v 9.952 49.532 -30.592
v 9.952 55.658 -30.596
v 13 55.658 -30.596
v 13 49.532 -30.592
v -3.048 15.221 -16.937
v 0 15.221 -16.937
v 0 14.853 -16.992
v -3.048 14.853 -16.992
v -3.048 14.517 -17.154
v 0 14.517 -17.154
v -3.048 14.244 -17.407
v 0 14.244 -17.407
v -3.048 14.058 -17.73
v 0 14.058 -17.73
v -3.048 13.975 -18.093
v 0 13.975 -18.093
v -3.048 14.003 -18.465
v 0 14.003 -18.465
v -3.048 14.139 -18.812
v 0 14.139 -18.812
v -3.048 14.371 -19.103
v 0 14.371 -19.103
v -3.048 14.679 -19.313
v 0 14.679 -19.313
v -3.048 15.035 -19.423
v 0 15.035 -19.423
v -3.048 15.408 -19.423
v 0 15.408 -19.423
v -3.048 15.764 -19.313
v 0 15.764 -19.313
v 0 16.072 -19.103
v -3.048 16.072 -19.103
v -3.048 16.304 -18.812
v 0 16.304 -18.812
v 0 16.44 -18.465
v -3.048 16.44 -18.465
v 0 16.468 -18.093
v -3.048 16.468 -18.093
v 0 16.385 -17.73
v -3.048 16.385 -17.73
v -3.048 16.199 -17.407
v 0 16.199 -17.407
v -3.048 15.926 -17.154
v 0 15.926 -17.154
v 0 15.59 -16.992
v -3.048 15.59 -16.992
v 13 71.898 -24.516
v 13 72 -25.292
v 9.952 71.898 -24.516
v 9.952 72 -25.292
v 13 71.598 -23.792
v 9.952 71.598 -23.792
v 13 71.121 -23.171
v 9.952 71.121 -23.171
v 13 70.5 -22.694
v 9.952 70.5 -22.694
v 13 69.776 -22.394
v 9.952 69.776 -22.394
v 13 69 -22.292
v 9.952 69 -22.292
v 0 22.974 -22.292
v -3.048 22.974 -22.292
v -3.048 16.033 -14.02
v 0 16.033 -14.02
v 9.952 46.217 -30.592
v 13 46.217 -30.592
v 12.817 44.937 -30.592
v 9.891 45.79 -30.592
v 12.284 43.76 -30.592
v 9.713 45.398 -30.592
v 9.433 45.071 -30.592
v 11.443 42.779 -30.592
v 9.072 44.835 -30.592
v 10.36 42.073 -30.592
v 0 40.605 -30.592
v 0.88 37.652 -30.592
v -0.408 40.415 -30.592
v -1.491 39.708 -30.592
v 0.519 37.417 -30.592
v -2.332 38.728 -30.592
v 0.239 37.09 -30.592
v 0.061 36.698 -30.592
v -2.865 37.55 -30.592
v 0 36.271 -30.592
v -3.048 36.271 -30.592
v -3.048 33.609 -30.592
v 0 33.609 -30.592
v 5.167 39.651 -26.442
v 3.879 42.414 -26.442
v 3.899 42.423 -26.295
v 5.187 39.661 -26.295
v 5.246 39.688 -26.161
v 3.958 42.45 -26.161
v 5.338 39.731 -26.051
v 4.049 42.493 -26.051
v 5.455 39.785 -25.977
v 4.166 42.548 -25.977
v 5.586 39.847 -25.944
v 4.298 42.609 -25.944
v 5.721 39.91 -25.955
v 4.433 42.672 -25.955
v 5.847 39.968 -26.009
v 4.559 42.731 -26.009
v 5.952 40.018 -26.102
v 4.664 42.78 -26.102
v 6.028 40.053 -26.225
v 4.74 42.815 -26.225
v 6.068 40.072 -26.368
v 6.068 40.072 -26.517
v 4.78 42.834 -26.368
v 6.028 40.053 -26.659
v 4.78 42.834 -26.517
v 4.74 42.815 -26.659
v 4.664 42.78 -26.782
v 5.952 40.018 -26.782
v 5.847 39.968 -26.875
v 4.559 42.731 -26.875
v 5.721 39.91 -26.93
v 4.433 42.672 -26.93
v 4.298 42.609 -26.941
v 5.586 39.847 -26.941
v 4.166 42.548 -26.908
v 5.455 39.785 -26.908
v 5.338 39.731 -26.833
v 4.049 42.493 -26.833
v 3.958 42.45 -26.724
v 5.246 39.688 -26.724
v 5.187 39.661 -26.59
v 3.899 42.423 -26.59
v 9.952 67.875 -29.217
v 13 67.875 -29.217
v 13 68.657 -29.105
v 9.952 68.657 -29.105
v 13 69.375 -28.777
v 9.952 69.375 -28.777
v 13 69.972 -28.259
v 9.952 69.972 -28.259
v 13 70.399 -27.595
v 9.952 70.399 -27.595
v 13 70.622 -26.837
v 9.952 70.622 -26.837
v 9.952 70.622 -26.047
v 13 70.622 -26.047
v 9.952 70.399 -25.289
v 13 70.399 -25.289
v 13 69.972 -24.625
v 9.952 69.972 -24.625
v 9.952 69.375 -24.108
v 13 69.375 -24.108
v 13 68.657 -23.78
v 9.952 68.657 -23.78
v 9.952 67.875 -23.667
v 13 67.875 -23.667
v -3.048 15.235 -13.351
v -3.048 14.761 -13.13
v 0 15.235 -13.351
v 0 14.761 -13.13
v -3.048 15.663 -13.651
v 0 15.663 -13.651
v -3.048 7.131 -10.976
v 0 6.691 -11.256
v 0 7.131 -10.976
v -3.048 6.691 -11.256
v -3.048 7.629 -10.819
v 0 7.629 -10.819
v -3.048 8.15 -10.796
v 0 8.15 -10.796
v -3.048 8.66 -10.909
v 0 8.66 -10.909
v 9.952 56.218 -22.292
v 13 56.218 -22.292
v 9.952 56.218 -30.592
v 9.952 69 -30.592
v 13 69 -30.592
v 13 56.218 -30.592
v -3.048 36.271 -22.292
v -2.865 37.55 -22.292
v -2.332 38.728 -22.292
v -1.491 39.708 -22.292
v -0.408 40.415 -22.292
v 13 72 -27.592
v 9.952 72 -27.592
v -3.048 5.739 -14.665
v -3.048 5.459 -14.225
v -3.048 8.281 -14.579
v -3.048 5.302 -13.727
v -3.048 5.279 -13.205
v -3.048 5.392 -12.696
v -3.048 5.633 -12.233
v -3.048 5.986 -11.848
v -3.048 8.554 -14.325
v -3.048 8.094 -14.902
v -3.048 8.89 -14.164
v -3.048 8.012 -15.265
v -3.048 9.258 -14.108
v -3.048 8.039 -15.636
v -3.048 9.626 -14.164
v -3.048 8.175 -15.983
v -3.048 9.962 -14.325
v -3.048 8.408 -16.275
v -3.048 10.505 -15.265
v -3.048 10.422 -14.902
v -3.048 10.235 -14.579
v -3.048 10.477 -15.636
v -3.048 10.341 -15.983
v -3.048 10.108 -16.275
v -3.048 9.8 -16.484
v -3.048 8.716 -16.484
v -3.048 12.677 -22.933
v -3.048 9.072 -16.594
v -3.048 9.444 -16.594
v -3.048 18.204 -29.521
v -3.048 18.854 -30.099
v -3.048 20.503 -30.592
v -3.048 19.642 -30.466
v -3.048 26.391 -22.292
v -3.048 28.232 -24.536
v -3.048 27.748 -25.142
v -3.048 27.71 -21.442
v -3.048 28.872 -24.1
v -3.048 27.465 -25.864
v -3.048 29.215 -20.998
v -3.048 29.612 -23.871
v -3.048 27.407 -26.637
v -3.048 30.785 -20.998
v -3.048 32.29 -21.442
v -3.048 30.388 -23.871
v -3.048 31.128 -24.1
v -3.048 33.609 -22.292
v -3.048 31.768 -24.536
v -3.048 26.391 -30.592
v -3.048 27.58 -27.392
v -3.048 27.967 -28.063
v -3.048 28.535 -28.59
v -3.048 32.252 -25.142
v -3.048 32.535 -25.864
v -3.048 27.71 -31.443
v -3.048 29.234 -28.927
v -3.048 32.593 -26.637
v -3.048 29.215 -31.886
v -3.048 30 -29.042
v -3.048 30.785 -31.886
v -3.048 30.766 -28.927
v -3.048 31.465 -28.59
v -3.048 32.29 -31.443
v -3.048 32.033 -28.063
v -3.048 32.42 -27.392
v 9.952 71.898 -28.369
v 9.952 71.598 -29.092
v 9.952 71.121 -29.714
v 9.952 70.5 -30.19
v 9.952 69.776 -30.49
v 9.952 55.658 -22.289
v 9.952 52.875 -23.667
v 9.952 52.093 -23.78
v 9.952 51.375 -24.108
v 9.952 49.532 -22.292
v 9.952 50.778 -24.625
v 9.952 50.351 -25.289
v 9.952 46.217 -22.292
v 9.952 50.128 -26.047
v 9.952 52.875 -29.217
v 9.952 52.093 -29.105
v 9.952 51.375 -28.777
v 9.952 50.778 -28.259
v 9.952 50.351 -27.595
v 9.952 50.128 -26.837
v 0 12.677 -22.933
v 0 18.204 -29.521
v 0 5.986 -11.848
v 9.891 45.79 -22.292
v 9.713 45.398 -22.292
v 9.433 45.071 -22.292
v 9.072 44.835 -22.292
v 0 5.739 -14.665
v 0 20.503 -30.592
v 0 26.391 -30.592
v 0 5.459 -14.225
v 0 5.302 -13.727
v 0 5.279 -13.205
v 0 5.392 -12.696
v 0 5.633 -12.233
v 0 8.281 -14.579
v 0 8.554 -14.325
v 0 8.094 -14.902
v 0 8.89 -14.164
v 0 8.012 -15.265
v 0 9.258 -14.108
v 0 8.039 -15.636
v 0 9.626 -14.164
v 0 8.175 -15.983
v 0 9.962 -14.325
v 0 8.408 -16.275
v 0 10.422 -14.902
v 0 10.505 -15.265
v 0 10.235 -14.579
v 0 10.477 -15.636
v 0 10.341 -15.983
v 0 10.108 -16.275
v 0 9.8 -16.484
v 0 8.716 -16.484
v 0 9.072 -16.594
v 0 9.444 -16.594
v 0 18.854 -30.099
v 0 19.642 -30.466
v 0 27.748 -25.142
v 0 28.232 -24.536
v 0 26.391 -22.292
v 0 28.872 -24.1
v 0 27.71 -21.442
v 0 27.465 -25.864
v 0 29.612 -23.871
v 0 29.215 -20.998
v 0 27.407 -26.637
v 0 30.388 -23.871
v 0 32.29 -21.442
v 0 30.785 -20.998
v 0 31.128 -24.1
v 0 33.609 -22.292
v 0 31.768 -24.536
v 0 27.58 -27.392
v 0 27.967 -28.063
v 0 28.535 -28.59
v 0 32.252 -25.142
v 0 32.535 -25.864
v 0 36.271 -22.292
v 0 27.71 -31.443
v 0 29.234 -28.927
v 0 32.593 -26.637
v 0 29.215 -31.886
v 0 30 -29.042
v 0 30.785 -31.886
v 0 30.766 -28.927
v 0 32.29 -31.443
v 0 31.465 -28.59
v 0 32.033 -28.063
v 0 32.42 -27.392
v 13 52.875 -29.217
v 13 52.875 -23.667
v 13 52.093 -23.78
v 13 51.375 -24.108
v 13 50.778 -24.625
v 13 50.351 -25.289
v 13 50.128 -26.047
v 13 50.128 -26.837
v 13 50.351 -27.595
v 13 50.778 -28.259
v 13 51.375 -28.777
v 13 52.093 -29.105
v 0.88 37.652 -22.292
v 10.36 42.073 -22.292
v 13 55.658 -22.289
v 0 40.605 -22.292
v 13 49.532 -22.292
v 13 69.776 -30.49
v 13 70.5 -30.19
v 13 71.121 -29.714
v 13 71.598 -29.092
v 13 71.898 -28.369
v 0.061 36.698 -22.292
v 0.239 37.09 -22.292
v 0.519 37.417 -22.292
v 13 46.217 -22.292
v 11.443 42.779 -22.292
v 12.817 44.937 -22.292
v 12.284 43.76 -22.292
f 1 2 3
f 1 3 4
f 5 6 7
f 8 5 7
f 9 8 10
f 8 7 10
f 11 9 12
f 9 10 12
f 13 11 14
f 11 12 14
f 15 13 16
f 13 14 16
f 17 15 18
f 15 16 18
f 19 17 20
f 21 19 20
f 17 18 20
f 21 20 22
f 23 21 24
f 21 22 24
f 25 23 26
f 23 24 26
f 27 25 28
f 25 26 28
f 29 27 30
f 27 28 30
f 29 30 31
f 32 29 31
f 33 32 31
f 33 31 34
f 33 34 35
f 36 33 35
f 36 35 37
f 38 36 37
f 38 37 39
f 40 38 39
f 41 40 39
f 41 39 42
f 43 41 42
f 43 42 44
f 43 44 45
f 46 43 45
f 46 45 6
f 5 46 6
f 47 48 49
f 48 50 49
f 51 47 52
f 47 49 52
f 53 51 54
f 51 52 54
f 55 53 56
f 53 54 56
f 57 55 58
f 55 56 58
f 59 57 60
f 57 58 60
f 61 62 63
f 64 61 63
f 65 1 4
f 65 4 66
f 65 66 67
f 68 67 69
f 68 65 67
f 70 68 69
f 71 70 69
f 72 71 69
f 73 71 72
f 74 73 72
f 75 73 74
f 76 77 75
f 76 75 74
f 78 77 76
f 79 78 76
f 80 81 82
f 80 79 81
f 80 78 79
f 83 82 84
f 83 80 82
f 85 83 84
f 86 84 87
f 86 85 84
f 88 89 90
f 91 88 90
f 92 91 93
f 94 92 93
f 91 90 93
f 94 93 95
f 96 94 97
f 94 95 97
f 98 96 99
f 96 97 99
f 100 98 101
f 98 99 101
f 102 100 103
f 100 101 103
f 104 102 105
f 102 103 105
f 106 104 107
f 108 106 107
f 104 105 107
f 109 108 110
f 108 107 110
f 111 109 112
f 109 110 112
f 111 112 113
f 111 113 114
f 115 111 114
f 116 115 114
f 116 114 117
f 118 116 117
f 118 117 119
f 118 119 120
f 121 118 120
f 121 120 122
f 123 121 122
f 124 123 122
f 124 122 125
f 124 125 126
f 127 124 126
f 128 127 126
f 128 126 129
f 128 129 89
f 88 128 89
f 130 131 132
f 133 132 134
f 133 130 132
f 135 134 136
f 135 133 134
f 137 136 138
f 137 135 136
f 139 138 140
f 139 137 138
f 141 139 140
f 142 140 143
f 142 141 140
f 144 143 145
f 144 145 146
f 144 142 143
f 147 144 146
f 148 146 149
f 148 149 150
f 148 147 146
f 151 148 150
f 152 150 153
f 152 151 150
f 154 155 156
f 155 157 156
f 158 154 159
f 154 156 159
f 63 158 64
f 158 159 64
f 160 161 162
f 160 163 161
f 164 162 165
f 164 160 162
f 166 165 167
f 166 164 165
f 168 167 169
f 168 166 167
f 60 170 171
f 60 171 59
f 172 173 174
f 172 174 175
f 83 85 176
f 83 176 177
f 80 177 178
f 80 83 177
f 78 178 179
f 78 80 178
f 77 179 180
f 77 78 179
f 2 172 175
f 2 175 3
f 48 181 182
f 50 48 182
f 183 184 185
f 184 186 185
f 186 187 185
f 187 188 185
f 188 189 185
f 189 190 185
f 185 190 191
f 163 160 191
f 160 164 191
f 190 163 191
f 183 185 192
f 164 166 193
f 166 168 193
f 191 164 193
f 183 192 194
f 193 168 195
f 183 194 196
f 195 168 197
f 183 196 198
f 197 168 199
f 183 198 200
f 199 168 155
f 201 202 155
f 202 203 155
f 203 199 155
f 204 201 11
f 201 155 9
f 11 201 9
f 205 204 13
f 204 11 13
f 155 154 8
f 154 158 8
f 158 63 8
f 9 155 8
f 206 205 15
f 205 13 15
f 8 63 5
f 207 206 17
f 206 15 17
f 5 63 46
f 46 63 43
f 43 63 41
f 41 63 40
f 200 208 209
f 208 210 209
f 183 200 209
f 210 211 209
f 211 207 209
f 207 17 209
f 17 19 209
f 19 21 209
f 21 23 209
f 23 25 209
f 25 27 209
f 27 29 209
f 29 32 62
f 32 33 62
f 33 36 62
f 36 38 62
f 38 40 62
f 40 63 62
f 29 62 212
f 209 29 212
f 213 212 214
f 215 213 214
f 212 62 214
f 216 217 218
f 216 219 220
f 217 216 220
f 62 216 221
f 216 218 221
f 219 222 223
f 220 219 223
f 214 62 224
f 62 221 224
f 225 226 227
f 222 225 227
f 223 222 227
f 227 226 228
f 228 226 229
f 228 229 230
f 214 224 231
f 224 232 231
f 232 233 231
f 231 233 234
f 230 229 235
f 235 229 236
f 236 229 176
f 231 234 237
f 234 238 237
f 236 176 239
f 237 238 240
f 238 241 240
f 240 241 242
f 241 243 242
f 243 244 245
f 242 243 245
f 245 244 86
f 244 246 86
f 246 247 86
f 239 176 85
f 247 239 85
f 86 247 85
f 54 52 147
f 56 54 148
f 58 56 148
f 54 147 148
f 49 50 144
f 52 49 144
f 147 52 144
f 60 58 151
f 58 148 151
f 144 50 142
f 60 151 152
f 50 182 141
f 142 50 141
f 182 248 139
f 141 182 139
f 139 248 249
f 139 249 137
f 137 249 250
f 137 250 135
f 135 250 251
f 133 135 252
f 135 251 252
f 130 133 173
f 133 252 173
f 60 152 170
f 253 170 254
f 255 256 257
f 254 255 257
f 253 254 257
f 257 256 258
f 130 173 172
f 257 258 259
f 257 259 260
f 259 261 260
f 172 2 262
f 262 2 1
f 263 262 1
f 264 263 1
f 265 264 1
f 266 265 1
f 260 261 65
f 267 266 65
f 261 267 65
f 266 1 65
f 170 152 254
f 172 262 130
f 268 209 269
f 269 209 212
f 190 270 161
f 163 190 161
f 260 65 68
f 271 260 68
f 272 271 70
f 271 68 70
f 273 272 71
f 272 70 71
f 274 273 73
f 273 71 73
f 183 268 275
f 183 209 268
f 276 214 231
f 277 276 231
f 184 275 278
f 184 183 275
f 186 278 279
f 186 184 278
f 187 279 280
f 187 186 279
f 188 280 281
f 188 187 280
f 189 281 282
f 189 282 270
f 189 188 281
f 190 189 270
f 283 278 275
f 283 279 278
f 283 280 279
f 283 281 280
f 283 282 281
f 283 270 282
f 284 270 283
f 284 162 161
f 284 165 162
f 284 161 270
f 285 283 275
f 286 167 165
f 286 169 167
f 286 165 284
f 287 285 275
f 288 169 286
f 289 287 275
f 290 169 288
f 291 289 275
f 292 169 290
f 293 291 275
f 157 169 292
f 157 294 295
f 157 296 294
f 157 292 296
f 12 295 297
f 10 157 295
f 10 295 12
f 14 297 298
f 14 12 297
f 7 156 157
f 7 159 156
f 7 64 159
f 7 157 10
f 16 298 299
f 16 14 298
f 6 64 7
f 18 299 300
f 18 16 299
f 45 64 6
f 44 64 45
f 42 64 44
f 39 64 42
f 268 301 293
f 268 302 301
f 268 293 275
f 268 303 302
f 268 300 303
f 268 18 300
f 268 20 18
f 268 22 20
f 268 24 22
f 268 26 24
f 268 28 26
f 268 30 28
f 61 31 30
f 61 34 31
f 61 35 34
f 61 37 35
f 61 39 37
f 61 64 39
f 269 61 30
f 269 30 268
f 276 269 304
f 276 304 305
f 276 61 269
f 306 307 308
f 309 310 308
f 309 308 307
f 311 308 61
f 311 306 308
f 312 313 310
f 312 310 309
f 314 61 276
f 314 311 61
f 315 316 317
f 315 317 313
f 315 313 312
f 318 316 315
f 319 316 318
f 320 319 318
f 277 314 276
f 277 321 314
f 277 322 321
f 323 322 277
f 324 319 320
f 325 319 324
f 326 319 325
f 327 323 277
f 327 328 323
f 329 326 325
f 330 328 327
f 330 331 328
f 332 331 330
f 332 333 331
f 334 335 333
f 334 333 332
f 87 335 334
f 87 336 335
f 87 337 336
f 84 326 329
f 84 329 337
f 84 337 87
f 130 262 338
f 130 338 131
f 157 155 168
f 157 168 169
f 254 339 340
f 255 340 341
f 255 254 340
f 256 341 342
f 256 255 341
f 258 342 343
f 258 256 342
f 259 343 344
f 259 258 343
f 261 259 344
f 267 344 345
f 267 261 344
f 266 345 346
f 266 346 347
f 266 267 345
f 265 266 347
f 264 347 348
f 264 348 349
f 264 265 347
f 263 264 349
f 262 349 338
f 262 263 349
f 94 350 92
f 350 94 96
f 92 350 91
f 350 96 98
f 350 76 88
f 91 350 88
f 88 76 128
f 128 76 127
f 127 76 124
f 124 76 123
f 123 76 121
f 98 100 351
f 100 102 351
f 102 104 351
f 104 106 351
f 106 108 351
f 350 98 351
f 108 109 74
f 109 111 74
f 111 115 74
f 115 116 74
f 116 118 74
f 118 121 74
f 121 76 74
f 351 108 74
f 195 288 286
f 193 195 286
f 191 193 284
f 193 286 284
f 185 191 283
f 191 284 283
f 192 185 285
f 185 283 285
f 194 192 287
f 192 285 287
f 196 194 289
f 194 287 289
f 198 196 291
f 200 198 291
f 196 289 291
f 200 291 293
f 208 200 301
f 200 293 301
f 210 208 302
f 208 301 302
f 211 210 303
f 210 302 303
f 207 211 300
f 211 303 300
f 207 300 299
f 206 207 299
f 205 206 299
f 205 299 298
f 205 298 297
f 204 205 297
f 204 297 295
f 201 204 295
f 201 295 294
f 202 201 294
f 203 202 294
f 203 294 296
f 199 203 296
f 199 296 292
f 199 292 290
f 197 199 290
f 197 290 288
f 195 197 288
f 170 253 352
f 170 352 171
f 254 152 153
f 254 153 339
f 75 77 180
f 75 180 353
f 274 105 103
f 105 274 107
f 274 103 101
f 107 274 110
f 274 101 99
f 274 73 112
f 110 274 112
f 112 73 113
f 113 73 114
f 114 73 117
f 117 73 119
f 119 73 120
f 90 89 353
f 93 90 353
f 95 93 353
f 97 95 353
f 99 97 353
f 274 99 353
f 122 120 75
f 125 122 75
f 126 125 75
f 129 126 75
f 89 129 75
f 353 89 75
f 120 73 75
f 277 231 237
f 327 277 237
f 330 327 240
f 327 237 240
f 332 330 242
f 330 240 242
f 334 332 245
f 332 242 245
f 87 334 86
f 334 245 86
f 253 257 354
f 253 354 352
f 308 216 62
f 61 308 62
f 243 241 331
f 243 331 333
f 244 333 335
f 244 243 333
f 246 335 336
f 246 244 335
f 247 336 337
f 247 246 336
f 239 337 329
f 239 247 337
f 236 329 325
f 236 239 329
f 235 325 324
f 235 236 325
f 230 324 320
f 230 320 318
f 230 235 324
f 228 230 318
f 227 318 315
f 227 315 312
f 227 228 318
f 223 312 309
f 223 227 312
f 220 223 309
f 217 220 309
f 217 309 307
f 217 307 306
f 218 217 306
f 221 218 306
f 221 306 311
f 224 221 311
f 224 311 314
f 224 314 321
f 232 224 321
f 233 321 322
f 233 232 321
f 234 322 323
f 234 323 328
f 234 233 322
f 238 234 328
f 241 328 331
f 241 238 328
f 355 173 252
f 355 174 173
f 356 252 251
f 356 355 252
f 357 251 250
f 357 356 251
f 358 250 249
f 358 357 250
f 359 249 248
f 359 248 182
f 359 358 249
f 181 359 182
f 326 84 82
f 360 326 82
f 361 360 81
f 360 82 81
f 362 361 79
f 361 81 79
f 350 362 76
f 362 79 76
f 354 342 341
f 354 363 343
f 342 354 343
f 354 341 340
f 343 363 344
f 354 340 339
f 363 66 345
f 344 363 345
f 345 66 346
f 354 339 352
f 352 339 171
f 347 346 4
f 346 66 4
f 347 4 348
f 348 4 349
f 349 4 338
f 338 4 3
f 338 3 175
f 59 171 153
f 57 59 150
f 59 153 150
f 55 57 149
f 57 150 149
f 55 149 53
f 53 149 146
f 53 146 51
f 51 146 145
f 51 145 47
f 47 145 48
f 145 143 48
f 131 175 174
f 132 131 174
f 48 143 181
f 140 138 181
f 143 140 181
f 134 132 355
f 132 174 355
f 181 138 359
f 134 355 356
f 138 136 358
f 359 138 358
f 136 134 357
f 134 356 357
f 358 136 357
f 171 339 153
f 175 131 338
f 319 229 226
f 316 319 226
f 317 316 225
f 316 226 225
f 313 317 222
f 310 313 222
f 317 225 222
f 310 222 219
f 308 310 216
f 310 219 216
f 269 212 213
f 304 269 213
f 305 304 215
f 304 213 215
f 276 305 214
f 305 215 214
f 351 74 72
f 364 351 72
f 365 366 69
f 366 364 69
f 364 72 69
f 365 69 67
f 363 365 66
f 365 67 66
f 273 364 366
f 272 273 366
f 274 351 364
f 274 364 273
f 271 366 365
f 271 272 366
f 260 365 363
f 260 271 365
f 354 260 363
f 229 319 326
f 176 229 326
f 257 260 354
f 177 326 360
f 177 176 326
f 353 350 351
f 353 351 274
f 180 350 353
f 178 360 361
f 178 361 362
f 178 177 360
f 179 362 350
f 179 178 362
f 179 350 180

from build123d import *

# Parameters (mm, degrees)
BASE_FLANGE1_START      = -3.048
BASE_FLANGE1_OUTLINE_R  = 2.6
BASE_FLANGE1_DEPTH      = 3.048
CHAMFER1_SIZE           = 5.5
CHAMFER1_SIZE2          = 9.526279442
FILLET5_R               = 3
JOG1_START              = -31.942217141
JOG1_DEPTH              = 22.299805307
JOG1_START_2            = -30.592217141
JOG1_2_DEPTH            = 1.375
JOG1_START_3            = -23.667217141
JOG1_3_DEPTH            = 1.375
JOG1_START_4            = -30.595801154
JOG1_4_DEPTH            = 8.307168025
JOG1_5_DEPTH            = 13
EDGE_FLANGE1_DEPTH      = 15
FILLET4_R               = 3
CUT_EXTRUDE4_DEPTH      = 85.269968197
CUT_EXTRUDE4_DEPTH_BACK = 85.269968197
M3X0_5_TAPPED_HOLE2_D   = 2.5
CUT_EXTRUDE5_REACH      = 59.699
SKETCH19_R              = 0.5
CUT_EXTRUDE6_DEPTH      = 80.832983383
FILLET9_R               = 2


with BuildPart() as part:
    # Base-Flange1: read off the stored shape, not the designer's step
    # Base-Flange1 outline → Base-Flange1 (new body)
    with BuildSketch(Plane(origin=(0, 0, 0), x_dir=(0, 0, -1), z_dir=(1, 0, 0)).offset(BASE_FLANGE1_START)):
        with BuildLine():
            Line((11.442217141, 3.034903463), (29.520579971, 18.204451045))
            ThreePointArc((29.520579971, 18.204451045), (30.311140503, 19.234729589), (30.592217141, 20.502584374))
            Line((30.592217141, 20.502584374), (30.592217141, 26.390637175))
            ThreePointArc((30.592217141, 26.390637175), (31.942217141, 30), (30.592217141, 33.609362825))
            Line((30.592217141, 33.609362825), (30.592217141, 49.531723164))
            Line((30.592217141, 49.531723164), (30.595801154, 55.658476217))
            Line((30.595801154, 55.658476217), (30.592217141, 56.218276836))
            Line((30.592217141, 56.218276836), (30.592217141, 72))
            Line((30.592217141, 72), (22.292217141, 72))
            Line((22.292217141, 72), (22.292217141, 56.218276836))
            Line((22.292217141, 56.218276836), (22.288633129, 55.658476217))
            Line((22.288633129, 55.658476217), (22.292217141, 49.531723164))
            Line((22.292217141, 49.531723164), (22.292217141, 33.609362825))
            ThreePointArc((22.292217141, 33.609362825), (20.942217141, 30), (22.292217141, 26.390637175))
            Line((22.292217141, 26.390637175), (22.292217141, 22.974014962))
            Line((22.292217141, 22.974014962), (6.107079981, 9.393072341))
            Line((6.107079981, 9.393072341), (11.442217141, 3.034903463))
        make_face()
        with Locations((26.442217141, 30)):
            Circle(BASE_FLANGE1_OUTLINE_R, mode=Mode.SUBTRACT)
        with BuildLine():
            ThreePointArc((23.667217141, 67.875), (26.442217141, 70.65), (29.217217141, 67.875))
            Line((29.217217141, 67.875), (29.217217141, 52.875))
            ThreePointArc((29.217217141, 52.875), (26.442217141, 50.1), (23.667217141, 52.875))
            Line((23.667217141, 52.875), (23.667217141, 67.875))
        make_face(mode=Mode.SUBTRACT)
    extrude(amount=BASE_FLANGE1_DEPTH)

    # Chamfer1
    chamfer1_edges = [part.edges().sort_by_distance(p)[0] for p in [
        (-1.524, 9.393072341, -6.107079981),
    ]]
    chamfer1_side = [part.faces().sort_by_distance(p)[0] for p in [
        (-1.524, 6.213987902, -8.774648561),
    ]]
    chamfer(chamfer1_edges, length=CHAMFER1_SIZE, length2=CHAMFER1_SIZE2, reference=chamfer1_side[0])

    # Fillet5
    fillet5_edges = [part.edges().sort_by_distance(p)[0] for p in [
        (-1.524, 15.516446733, -13.404633411),
    ]]
    fillet(fillet5_edges, radius=FILLET5_R)

    # Jog1: read off the stored shape, not the designer's step
    # Jog1 outline → Jog1 (cut)
    with BuildSketch(Plane.XY.offset(JOG1_START)):
        with BuildLine():
            Line((-0.408210693, 40.414716045), (0, 40.605067817))
            Line((0, 40.605067817), (0, 72))
            Line((0, 72), (-3.048, 72))
            Line((-3.048, 72), (-3.048, 36.271076843))
            ThreePointArc((-3.048, 36.271076843), (-2.33198569, 38.727610652), (-0.408210693, 40.414716045))
        make_face()
    extrude(amount=JOG1_DEPTH, mode=Mode.SUBTRACT)

    # Jog1 2 outline → Jog1 2 (add)
    with BuildSketch(Plane.XY.offset(JOG1_START_2)):
        with BuildLine():
            ThreePointArc((0, 36.271076843), (0.238671437, 37.089921446), (0.879929769, 37.65228991))
            Line((0.879929769, 37.65228991), (10.360210693, 42.073017507))
            ThreePointArc((10.360210693, 42.073017507), (12.28398569, 43.7601229), (13, 46.216656709))
            Line((13, 46.216656709), (13, 72))
            Line((13, 72), (9.952, 72))
            Line((9.952, 72), (9.952, 46.216656709))
            ThreePointArc((9.952, 46.216656709), (9.713328563, 45.397812106), (9.072070231, 44.835443641))
            Line((9.072070231, 44.835443641), (0, 40.605067817))
            Line((0, 40.605067817), (0, 36.271076843))
        make_face()
    extrude(amount=JOG1_2_DEPTH)

    # Jog1 3 outline → Jog1 3 (add)
    with BuildSketch(Plane.XY.offset(JOG1_START_3)):
        with BuildLine():
            ThreePointArc((0, 36.271076843), (0.238671437, 37.089921446), (0.879929769, 37.65228991))
            Line((0.879929769, 37.65228991), (10.360210693, 42.073017507))
            ThreePointArc((10.360210693, 42.073017507), (12.28398569, 43.7601229), (13, 46.216656709))
            Line((13, 46.216656709), (13, 72))
            Line((13, 72), (9.952, 72))
            Line((9.952, 72), (9.952, 46.216656709))
            ThreePointArc((9.952, 46.216656709), (9.713328563, 45.397812106), (9.072070231, 44.835443641))
            Line((9.072070231, 44.835443641), (0, 40.605067817))
            Line((0, 40.605067817), (0, 36.271076843))
        make_face()
    extrude(amount=JOG1_3_DEPTH)

    # Jog1 4 outline → Jog1 4 (add)
    with BuildSketch(Plane.XY.offset(JOG1_START_4)):
        with BuildLine():
            ThreePointArc((0, 36.271076843), (0.238671437, 37.089921446), (0.879929769, 37.65228991))
            Line((0.879929769, 37.65228991), (10.360210693, 42.073017507))
            ThreePointArc((10.360210693, 42.073017507), (12.28398569, 43.7601229), (13, 46.216656709))
            Line((13, 46.216656709), (13, 72))
            Line((13, 72), (9.952, 72))
            Line((9.952, 72), (9.952, 46.216656709))
            ThreePointArc((9.952, 46.216656709), (9.713328563, 45.397812106), (9.072070231, 44.835443641))
            Line((9.072070231, 44.835443641), (0, 40.605067817))
            Line((0, 40.605067817), (0, 36.271076843))
        make_face()
    extrude(amount=JOG1_4_DEPTH)

    # Jog1 5 outline → Jog1 5 (cut)
    with BuildSketch(Plane.YZ):
        Polygon((49.531723164, -30.592217141), (35, -30.592217141), (35, -30.595801154), (55.658476217, -30.595801154), align=None)
        Polygon((35, -22.288633129), (35, -22.292217141), (49.531723164, -22.292217141), (55.658476217, -22.288633129), align=None)
        Polygon((56.218276836, -30.592217141), (55.658476217, -30.595801154), (73, -30.595801154), (73, -30.592217141), align=None)
        Polygon((73, -22.288633129), (55.658476217, -22.288633129), (56.218276836, -22.292217141), (73, -22.292217141), align=None)
        with BuildLine():
            Line((67.875, -23.667217141), (52.875, -23.667217141))
            ThreePointArc((52.875, -23.667217141), (50.1, -26.442217141), (52.875, -29.217217141))
            Line((52.875, -29.217217141), (67.875, -29.217217141))
            ThreePointArc((67.875, -29.217217141), (70.65, -26.442217141), (67.875, -23.667217141))
        make_face()
    extrude(amount=JOG1_5_DEPTH, mode=Mode.SUBTRACT)

    # Edge-Flange1: sheet metal written as solids
    # Edge-Flange1 section (on a plane across the edge) → Edge-Flange1 (add)
    with BuildSketch(Plane(origin=(0, 1.867451731, -12.421825459), x_dir=(3.4914813388431326e-15, 0.7660444431189821, 0.6427876096865346), z_dir=(0, 0.6427876096865346, -0.7660444431189821))):
        with BuildLine():
            Line((-3.048, 1.524), (-3.048, 29.952))
            Line((-3.048, 29.952), (0, 29.952))
            Line((0, 29.952), (0, 1.524))
            ThreePointArc((0, 1.524), (0.446369265, 0.446369265), (1.524, 0))
            Line((1.524, 0), (1.524, -3.048))
            ThreePointArc((1.524, -3.048), (-1.708892204, -1.708892204), (-3.048, 1.524))
        make_face()
    extrude(amount=EDGE_FLANGE1_DEPTH)

    # Fillet4
    fillet4_edges = [part.edges().sort_by_distance(p)[0] for p in [
        (11.476, 72, -30.592217141),
        (11.476, 72, -22.292217141),
    ]]
    fillet(fillet4_edges, radius=FILLET4_R)

    # Sketch17 → Cut-Extrude4 (cut, two sides: drawn at the far end of the back side and taken through both)
    with BuildSketch(Plane(origin=(0, 0, 0), x_dir=(0, 0, -1), z_dir=(1, 0, 0)).offset(-CUT_EXTRUDE4_DEPTH_BACK)):
        Polygon((22.932883788, 12.676717608), (2.605814743, -4.379718531), (8.769545562, -11.725366877), (29.096614607, 5.331069261), align=None)
    extrude(amount=CUT_EXTRUDE4_DEPTH + CUT_EXTRUDE4_DEPTH_BACK, mode=Mode.SUBTRACT)

    # M3x0.5 Tapped Hole2 (through all)
    with Locations(Plane(origin=(-3.048, 15.221364604, -18.186856854), x_dir=(0, 0, -1), z_dir=(-1, 0, 0))):
        with Locations((0, 0), (-2.828600732, 5.963347877)):
            Hole(M3X0_5_TAPPED_HOLE2_D / 2)

    # Sketch19 → Cut-Extrude5 (cut, up to next)
    with BuildSketch(Plane(origin=(-15.552643282, 33.35275115, 0), x_dir=(0.906307787036651, 0.4226182617406973, 0), z_dir=(-0.4226182617406973, 0.906307787036651, 0)), mode=Mode.PRIVATE) as cut_extrude5_sk1:
        with Locations(Location((21.940198833, 26.442217141, 0), (0, 0, 180))):
            Circle(SKETCH19_R)
    cut_extrude5_tool1 = extrude(cut_extrude5_sk1.sketch, amount=-CUT_EXTRUDE5_REACH, mode=Mode.PRIVATE) & part.part
    add(cut_extrude5_tool1.solids().sort_by_distance((4.33193, 42.62508, -26.442217))[0], mode=Mode.SUBTRACT)

    # Sketch21 → Cut-Extrude6 (cut, through all)
    with BuildSketch(Plane(origin=(0, 0, 0), x_dir=(0, 0, -1), z_dir=(1, 0, 0))):
        Polygon((10.514234213, 7.575140201), (9.642411834, 5.179827903), (11.442217141, 3.034903463), (13.133284575, 4.453877523), align=None)
    extrude(amount=-CUT_EXTRUDE6_DEPTH, mode=Mode.SUBTRACT)

    # Fillet9
    fillet9_edges = [part.edges().sort_by_distance(p)[0] for p in [
        (-1.524, 7.575140201, -10.514234213),
        (-1.524, 4.453877523, -13.133284575),
    ]]
    fillet(fillet9_edges, radius=FILLET9_R)


solid = part.part
